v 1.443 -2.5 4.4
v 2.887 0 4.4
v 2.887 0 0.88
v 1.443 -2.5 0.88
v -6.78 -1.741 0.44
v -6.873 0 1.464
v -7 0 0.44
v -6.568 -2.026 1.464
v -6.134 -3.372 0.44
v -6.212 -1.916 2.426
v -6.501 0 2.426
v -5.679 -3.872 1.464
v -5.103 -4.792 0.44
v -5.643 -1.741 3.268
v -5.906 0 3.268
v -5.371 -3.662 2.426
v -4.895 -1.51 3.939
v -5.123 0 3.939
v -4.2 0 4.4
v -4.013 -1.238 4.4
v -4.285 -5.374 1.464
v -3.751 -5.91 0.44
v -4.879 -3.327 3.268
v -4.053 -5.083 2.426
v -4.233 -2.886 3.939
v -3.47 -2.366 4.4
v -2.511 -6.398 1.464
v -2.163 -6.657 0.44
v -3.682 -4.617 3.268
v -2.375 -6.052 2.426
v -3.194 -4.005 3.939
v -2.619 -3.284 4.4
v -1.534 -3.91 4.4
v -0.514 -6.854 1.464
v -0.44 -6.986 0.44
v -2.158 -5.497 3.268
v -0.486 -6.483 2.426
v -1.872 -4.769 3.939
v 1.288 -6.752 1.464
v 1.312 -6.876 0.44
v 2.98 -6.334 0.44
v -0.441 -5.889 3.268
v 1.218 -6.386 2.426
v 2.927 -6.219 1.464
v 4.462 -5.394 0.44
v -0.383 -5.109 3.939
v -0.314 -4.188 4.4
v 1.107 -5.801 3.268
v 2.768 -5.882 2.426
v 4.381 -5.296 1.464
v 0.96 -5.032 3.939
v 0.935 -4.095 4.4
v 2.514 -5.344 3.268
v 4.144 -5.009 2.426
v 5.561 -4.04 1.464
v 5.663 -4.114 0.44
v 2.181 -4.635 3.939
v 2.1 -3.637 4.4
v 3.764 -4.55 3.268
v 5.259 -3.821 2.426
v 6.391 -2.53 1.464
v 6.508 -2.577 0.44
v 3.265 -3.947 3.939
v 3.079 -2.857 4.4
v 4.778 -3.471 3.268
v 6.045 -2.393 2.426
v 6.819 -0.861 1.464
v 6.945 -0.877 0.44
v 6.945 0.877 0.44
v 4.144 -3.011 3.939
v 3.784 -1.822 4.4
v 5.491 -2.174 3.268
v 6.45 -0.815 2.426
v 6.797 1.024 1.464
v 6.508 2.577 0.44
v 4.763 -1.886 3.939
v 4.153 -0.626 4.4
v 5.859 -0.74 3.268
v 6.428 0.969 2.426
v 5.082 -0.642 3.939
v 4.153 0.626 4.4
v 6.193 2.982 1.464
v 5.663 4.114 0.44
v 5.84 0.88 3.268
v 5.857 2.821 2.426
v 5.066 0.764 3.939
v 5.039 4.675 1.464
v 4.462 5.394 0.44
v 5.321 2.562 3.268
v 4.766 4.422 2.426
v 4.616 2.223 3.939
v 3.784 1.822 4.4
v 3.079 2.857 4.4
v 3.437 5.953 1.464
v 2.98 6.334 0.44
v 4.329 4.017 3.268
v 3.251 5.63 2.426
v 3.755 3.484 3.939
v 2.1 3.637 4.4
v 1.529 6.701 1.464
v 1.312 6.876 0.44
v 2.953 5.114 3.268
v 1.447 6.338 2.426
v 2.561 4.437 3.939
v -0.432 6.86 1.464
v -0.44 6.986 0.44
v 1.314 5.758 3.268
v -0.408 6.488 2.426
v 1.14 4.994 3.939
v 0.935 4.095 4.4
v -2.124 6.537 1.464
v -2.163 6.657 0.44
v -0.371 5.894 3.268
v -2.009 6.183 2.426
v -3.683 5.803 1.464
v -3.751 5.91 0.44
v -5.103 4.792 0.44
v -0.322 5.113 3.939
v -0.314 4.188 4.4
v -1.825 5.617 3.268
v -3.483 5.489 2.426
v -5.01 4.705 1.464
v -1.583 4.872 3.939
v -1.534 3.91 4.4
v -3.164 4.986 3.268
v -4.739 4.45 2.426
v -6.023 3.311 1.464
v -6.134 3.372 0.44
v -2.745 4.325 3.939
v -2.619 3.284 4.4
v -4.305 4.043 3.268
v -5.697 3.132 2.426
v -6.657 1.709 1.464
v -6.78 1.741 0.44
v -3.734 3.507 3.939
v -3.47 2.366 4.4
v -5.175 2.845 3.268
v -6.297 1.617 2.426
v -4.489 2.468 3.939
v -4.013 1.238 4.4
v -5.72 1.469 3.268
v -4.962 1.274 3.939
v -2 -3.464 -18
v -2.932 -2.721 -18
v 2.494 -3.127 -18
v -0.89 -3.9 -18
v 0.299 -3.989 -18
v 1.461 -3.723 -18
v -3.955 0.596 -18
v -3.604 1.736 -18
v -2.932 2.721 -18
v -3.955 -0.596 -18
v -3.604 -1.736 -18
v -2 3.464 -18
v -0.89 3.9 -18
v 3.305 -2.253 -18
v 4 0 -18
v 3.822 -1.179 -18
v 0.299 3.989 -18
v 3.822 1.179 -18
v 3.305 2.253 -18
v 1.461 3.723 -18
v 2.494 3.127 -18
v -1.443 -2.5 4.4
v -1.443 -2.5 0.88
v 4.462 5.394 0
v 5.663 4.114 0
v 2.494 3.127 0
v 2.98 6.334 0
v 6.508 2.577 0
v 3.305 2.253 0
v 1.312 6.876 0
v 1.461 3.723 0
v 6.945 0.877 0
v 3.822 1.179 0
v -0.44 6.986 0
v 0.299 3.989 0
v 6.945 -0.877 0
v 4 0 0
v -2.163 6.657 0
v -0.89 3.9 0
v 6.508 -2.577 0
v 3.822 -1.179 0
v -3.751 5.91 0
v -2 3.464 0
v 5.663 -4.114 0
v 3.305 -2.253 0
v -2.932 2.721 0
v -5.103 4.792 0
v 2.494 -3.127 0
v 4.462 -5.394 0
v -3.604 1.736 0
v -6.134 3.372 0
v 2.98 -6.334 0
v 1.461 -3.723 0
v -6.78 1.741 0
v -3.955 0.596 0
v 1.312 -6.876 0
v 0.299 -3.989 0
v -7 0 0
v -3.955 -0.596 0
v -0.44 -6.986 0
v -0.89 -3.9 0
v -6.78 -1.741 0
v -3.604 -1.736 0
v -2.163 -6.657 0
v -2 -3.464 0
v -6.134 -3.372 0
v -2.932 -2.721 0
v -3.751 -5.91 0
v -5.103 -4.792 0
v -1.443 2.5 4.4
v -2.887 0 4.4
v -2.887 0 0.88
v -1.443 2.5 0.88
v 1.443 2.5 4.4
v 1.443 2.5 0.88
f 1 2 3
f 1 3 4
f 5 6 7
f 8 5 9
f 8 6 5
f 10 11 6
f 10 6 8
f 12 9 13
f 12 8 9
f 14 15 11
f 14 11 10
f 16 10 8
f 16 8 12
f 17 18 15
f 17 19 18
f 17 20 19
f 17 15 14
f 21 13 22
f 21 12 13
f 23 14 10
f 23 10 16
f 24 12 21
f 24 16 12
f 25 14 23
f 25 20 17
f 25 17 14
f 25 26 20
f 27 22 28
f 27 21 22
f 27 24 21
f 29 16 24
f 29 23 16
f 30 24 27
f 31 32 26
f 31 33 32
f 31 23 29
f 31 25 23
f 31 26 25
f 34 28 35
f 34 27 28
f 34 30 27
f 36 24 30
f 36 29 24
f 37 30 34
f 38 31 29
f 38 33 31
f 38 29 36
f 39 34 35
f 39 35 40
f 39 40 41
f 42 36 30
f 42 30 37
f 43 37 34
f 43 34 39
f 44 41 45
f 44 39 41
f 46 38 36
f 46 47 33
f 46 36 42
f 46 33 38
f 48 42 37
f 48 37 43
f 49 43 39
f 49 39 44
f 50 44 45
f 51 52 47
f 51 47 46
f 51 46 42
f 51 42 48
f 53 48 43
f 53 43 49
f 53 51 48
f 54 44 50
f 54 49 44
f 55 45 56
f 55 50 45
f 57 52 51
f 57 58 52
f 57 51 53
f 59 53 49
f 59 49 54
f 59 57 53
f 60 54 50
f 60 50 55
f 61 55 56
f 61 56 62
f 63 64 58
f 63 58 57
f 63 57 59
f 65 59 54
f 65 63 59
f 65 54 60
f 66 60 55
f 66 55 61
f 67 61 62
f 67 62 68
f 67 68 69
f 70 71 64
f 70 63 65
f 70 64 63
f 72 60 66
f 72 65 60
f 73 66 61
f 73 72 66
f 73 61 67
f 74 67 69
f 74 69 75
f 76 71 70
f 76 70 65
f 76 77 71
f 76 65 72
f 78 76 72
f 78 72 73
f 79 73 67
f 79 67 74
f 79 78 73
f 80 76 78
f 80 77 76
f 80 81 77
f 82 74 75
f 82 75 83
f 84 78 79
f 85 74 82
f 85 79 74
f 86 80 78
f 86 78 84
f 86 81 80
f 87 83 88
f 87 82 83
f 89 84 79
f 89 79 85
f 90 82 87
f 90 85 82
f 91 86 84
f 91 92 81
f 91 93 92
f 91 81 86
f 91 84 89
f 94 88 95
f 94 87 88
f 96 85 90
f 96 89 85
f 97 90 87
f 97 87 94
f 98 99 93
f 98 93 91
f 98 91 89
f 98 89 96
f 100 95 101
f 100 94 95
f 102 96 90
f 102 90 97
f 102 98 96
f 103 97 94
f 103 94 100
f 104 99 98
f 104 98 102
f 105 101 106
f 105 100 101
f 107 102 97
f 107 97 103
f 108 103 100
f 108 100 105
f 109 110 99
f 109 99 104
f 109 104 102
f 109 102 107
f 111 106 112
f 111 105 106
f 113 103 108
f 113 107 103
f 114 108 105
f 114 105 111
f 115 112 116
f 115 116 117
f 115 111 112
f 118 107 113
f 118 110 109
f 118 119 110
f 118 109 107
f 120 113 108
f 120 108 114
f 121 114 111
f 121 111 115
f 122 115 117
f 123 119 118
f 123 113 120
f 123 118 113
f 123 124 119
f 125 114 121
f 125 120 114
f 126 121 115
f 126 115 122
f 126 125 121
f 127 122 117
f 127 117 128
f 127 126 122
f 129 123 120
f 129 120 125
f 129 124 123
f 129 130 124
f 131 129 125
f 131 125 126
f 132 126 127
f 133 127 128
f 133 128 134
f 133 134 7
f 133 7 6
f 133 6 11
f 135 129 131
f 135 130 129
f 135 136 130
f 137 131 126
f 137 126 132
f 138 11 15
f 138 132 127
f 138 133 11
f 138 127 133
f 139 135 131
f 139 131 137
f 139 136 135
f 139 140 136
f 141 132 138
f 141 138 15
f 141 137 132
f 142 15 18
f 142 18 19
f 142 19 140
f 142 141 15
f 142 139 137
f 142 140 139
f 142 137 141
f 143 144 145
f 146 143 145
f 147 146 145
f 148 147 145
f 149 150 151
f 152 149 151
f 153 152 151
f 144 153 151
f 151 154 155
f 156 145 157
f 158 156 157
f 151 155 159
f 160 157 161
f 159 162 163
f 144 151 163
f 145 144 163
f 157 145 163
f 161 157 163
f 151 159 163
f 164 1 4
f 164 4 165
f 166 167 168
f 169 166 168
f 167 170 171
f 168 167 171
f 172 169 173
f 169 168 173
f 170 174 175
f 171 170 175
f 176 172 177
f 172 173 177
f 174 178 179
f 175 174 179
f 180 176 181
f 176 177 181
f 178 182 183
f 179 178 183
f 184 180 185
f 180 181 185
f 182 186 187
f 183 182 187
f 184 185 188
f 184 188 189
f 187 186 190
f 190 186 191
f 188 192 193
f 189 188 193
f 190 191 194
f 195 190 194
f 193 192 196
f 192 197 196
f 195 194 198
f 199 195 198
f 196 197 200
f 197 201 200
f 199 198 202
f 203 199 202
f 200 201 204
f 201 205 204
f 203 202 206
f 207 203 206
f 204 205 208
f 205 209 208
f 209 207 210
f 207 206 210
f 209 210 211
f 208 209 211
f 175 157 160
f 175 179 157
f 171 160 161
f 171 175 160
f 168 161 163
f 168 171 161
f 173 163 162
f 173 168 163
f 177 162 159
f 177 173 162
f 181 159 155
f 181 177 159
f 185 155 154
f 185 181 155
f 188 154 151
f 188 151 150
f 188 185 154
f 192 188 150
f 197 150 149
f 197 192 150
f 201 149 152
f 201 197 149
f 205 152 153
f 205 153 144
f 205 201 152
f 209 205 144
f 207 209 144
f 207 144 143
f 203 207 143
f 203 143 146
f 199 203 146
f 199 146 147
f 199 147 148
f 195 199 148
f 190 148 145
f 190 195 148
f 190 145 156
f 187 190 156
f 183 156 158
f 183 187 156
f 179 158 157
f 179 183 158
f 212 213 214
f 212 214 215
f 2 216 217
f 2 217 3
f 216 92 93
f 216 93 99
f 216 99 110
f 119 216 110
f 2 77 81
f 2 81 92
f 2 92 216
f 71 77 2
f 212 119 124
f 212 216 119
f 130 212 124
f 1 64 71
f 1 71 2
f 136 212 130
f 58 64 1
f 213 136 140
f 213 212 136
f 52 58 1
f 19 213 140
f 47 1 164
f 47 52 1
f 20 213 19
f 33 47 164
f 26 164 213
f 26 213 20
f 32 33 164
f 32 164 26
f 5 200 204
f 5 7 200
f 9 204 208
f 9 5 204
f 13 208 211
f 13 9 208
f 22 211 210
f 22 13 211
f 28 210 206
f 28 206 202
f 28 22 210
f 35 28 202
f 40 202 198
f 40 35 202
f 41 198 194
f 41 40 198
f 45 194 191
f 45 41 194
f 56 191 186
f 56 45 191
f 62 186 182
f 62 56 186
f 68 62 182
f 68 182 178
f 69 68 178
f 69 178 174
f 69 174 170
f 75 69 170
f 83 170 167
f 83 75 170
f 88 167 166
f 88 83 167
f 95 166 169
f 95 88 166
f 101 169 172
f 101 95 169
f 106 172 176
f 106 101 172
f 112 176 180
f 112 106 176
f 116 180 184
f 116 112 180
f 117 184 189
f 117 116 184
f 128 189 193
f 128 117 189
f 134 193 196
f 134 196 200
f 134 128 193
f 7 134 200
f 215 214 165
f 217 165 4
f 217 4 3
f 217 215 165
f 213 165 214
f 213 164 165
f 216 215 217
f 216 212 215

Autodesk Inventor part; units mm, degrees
ref_plane "YZ Plane" through (0, 0, 0) normal (1, 0, 0) x (0, 1, 0)
ref_plane "XZ Plane" through (0, 0, 0) normal (0, 1, 0) x (-1, 0, 0)
sketch "Sketch1" plane through (0, 0, 0) normal (0, 0, 1) x (1, 0, 0)
  circle A0 centre (0, 0) radius 4
  dimension "Dia" = 8
extrude "Base" add sketch "Sketch1" against normal blind 18
ref_plane "Hex Key Sketch Plane" through (0, 0, 4.4) normal (0, 0, 1) x (1, 0, 0)
sketch "Sketch2" plane through (0, 0, 0) normal (0, 1, 0) x (-1, 0, 0)
  line L0 (0, -0.969) -> (0, 5.8139) projected
  line L1 (-4, 0) -> (4, 0) projected
  line L2 (0, 0) -> (7, 0)
  line L3 (7, 0) -> (7, 0.44)
  arc A0 (7, 0.44) -> (4.2, 4.4) centre (2.7997, 0.44) ccw
  line L4 (4.2, 4.4) -> (0, 4.4)
  line L5 (0, 4.4) -> (0, 0)
  dimension "d3" = 4.4
  dimension "d4" = 0.44
  dimension "d5" = 14
  dimension "d6" = 2.8
revolve "Button Head" add sketch "Sketch2" angle 360 about axis through (0, 0, -10) along (0, 0, 1)
sketch "Sketch4" plane through (0, 0, 0) normal (0, 1, 0) x (-1, 0, 0)
  line L0 (0, -0.88) -> (0, 5.28) projected
  line L1 (-4, 0) -> (4, 0) projected
  line L2 (0, 0) -> (7, 0)
  line L3 (7, 0) -> (7, 4.4)
  line L4 (7, 4.4) -> (0, 4.4)
  line L5 (0, 4.4) -> (0, 0)
  dimension "d13" = 4.4
  dimension "d14" = 14
revolve "Cap Head" [suppressed]
sketch "Sketch3" plane through (0, 0, 0) normal (0, 1, 0) x (-1, 0, 0)
  line L0 (0, -21.6) -> (0, 3.6) projected
  line L1 (-4, 0) -> (4, 0) projected
  line L2 (4, 0) -> (4, -18) projected
  line L3 (0, 0) -> (7, 0)
  line L4 (7, 0) -> (7, -0.44)
  line L5 (7, -0.44) -> (4, -4.4)
  line L6 (4, -4.4) -> (0, -4.4)
  line L7 (0, 0) -> (0, -4.4)
  dimension "d9" = 4.4
  dimension "d10" = 14
  dimension "d11" = 0.44
revolve "Flat Head" [suppressed]
sketch "Sketch5" plane through (0, 0, 4.4) normal (0, 0, 1) x (1, 0, 0)
  line L0 (1.4434, 2.5) -> (2.8868, 0)
  line L1 (2.8868, 0) -> (1.4434, -2.5)
  line L2 (1.4434, -2.5) -> (-1.4434, -2.5)
  line L3 (-1.4434, -2.5) -> (-2.8868, 0)
  line L4 (-2.8868, 0) -> (-1.4434, 2.5)
  line L5 (-1.4434, 2.5) -> (1.4434, 2.5)
  point P0 (0, 0)
  point P1 (0, 0)
  dimension "d16" = 5
extrude "Hex Socket" cut sketch "Sketch5" against normal blind 3.52
thread "Thread1" size "M8x1.25" class "6g" standard "ANSI Metric M Profile" full length
equation "\"d3\" = H_K"
equation "\"d4\" = 0.1 * H_K"
equation "\"d5\" = Dk"
equation "\"d6\" = 0.2 * Dk"
equation "\"d13\" = H_K"
equation "\"d14\" = Dk"
equation "\"d9\" = H_K"
equation "\"d10\" = Dk"
equation "\"d11\" = 0.1 * H_K"
equation "\"d16\" = H_S"
equation "\"d17\" = 0.8 * H_K"
equation "\"Dk\" = 14"
equation "\"H_K\" = 4.4"
equation "\"H_S\" = 5"
equation "\"HexStartHeight\" = H_K"
properties part number "24-118-8" material "Steel, High Strength Low Alloy"
